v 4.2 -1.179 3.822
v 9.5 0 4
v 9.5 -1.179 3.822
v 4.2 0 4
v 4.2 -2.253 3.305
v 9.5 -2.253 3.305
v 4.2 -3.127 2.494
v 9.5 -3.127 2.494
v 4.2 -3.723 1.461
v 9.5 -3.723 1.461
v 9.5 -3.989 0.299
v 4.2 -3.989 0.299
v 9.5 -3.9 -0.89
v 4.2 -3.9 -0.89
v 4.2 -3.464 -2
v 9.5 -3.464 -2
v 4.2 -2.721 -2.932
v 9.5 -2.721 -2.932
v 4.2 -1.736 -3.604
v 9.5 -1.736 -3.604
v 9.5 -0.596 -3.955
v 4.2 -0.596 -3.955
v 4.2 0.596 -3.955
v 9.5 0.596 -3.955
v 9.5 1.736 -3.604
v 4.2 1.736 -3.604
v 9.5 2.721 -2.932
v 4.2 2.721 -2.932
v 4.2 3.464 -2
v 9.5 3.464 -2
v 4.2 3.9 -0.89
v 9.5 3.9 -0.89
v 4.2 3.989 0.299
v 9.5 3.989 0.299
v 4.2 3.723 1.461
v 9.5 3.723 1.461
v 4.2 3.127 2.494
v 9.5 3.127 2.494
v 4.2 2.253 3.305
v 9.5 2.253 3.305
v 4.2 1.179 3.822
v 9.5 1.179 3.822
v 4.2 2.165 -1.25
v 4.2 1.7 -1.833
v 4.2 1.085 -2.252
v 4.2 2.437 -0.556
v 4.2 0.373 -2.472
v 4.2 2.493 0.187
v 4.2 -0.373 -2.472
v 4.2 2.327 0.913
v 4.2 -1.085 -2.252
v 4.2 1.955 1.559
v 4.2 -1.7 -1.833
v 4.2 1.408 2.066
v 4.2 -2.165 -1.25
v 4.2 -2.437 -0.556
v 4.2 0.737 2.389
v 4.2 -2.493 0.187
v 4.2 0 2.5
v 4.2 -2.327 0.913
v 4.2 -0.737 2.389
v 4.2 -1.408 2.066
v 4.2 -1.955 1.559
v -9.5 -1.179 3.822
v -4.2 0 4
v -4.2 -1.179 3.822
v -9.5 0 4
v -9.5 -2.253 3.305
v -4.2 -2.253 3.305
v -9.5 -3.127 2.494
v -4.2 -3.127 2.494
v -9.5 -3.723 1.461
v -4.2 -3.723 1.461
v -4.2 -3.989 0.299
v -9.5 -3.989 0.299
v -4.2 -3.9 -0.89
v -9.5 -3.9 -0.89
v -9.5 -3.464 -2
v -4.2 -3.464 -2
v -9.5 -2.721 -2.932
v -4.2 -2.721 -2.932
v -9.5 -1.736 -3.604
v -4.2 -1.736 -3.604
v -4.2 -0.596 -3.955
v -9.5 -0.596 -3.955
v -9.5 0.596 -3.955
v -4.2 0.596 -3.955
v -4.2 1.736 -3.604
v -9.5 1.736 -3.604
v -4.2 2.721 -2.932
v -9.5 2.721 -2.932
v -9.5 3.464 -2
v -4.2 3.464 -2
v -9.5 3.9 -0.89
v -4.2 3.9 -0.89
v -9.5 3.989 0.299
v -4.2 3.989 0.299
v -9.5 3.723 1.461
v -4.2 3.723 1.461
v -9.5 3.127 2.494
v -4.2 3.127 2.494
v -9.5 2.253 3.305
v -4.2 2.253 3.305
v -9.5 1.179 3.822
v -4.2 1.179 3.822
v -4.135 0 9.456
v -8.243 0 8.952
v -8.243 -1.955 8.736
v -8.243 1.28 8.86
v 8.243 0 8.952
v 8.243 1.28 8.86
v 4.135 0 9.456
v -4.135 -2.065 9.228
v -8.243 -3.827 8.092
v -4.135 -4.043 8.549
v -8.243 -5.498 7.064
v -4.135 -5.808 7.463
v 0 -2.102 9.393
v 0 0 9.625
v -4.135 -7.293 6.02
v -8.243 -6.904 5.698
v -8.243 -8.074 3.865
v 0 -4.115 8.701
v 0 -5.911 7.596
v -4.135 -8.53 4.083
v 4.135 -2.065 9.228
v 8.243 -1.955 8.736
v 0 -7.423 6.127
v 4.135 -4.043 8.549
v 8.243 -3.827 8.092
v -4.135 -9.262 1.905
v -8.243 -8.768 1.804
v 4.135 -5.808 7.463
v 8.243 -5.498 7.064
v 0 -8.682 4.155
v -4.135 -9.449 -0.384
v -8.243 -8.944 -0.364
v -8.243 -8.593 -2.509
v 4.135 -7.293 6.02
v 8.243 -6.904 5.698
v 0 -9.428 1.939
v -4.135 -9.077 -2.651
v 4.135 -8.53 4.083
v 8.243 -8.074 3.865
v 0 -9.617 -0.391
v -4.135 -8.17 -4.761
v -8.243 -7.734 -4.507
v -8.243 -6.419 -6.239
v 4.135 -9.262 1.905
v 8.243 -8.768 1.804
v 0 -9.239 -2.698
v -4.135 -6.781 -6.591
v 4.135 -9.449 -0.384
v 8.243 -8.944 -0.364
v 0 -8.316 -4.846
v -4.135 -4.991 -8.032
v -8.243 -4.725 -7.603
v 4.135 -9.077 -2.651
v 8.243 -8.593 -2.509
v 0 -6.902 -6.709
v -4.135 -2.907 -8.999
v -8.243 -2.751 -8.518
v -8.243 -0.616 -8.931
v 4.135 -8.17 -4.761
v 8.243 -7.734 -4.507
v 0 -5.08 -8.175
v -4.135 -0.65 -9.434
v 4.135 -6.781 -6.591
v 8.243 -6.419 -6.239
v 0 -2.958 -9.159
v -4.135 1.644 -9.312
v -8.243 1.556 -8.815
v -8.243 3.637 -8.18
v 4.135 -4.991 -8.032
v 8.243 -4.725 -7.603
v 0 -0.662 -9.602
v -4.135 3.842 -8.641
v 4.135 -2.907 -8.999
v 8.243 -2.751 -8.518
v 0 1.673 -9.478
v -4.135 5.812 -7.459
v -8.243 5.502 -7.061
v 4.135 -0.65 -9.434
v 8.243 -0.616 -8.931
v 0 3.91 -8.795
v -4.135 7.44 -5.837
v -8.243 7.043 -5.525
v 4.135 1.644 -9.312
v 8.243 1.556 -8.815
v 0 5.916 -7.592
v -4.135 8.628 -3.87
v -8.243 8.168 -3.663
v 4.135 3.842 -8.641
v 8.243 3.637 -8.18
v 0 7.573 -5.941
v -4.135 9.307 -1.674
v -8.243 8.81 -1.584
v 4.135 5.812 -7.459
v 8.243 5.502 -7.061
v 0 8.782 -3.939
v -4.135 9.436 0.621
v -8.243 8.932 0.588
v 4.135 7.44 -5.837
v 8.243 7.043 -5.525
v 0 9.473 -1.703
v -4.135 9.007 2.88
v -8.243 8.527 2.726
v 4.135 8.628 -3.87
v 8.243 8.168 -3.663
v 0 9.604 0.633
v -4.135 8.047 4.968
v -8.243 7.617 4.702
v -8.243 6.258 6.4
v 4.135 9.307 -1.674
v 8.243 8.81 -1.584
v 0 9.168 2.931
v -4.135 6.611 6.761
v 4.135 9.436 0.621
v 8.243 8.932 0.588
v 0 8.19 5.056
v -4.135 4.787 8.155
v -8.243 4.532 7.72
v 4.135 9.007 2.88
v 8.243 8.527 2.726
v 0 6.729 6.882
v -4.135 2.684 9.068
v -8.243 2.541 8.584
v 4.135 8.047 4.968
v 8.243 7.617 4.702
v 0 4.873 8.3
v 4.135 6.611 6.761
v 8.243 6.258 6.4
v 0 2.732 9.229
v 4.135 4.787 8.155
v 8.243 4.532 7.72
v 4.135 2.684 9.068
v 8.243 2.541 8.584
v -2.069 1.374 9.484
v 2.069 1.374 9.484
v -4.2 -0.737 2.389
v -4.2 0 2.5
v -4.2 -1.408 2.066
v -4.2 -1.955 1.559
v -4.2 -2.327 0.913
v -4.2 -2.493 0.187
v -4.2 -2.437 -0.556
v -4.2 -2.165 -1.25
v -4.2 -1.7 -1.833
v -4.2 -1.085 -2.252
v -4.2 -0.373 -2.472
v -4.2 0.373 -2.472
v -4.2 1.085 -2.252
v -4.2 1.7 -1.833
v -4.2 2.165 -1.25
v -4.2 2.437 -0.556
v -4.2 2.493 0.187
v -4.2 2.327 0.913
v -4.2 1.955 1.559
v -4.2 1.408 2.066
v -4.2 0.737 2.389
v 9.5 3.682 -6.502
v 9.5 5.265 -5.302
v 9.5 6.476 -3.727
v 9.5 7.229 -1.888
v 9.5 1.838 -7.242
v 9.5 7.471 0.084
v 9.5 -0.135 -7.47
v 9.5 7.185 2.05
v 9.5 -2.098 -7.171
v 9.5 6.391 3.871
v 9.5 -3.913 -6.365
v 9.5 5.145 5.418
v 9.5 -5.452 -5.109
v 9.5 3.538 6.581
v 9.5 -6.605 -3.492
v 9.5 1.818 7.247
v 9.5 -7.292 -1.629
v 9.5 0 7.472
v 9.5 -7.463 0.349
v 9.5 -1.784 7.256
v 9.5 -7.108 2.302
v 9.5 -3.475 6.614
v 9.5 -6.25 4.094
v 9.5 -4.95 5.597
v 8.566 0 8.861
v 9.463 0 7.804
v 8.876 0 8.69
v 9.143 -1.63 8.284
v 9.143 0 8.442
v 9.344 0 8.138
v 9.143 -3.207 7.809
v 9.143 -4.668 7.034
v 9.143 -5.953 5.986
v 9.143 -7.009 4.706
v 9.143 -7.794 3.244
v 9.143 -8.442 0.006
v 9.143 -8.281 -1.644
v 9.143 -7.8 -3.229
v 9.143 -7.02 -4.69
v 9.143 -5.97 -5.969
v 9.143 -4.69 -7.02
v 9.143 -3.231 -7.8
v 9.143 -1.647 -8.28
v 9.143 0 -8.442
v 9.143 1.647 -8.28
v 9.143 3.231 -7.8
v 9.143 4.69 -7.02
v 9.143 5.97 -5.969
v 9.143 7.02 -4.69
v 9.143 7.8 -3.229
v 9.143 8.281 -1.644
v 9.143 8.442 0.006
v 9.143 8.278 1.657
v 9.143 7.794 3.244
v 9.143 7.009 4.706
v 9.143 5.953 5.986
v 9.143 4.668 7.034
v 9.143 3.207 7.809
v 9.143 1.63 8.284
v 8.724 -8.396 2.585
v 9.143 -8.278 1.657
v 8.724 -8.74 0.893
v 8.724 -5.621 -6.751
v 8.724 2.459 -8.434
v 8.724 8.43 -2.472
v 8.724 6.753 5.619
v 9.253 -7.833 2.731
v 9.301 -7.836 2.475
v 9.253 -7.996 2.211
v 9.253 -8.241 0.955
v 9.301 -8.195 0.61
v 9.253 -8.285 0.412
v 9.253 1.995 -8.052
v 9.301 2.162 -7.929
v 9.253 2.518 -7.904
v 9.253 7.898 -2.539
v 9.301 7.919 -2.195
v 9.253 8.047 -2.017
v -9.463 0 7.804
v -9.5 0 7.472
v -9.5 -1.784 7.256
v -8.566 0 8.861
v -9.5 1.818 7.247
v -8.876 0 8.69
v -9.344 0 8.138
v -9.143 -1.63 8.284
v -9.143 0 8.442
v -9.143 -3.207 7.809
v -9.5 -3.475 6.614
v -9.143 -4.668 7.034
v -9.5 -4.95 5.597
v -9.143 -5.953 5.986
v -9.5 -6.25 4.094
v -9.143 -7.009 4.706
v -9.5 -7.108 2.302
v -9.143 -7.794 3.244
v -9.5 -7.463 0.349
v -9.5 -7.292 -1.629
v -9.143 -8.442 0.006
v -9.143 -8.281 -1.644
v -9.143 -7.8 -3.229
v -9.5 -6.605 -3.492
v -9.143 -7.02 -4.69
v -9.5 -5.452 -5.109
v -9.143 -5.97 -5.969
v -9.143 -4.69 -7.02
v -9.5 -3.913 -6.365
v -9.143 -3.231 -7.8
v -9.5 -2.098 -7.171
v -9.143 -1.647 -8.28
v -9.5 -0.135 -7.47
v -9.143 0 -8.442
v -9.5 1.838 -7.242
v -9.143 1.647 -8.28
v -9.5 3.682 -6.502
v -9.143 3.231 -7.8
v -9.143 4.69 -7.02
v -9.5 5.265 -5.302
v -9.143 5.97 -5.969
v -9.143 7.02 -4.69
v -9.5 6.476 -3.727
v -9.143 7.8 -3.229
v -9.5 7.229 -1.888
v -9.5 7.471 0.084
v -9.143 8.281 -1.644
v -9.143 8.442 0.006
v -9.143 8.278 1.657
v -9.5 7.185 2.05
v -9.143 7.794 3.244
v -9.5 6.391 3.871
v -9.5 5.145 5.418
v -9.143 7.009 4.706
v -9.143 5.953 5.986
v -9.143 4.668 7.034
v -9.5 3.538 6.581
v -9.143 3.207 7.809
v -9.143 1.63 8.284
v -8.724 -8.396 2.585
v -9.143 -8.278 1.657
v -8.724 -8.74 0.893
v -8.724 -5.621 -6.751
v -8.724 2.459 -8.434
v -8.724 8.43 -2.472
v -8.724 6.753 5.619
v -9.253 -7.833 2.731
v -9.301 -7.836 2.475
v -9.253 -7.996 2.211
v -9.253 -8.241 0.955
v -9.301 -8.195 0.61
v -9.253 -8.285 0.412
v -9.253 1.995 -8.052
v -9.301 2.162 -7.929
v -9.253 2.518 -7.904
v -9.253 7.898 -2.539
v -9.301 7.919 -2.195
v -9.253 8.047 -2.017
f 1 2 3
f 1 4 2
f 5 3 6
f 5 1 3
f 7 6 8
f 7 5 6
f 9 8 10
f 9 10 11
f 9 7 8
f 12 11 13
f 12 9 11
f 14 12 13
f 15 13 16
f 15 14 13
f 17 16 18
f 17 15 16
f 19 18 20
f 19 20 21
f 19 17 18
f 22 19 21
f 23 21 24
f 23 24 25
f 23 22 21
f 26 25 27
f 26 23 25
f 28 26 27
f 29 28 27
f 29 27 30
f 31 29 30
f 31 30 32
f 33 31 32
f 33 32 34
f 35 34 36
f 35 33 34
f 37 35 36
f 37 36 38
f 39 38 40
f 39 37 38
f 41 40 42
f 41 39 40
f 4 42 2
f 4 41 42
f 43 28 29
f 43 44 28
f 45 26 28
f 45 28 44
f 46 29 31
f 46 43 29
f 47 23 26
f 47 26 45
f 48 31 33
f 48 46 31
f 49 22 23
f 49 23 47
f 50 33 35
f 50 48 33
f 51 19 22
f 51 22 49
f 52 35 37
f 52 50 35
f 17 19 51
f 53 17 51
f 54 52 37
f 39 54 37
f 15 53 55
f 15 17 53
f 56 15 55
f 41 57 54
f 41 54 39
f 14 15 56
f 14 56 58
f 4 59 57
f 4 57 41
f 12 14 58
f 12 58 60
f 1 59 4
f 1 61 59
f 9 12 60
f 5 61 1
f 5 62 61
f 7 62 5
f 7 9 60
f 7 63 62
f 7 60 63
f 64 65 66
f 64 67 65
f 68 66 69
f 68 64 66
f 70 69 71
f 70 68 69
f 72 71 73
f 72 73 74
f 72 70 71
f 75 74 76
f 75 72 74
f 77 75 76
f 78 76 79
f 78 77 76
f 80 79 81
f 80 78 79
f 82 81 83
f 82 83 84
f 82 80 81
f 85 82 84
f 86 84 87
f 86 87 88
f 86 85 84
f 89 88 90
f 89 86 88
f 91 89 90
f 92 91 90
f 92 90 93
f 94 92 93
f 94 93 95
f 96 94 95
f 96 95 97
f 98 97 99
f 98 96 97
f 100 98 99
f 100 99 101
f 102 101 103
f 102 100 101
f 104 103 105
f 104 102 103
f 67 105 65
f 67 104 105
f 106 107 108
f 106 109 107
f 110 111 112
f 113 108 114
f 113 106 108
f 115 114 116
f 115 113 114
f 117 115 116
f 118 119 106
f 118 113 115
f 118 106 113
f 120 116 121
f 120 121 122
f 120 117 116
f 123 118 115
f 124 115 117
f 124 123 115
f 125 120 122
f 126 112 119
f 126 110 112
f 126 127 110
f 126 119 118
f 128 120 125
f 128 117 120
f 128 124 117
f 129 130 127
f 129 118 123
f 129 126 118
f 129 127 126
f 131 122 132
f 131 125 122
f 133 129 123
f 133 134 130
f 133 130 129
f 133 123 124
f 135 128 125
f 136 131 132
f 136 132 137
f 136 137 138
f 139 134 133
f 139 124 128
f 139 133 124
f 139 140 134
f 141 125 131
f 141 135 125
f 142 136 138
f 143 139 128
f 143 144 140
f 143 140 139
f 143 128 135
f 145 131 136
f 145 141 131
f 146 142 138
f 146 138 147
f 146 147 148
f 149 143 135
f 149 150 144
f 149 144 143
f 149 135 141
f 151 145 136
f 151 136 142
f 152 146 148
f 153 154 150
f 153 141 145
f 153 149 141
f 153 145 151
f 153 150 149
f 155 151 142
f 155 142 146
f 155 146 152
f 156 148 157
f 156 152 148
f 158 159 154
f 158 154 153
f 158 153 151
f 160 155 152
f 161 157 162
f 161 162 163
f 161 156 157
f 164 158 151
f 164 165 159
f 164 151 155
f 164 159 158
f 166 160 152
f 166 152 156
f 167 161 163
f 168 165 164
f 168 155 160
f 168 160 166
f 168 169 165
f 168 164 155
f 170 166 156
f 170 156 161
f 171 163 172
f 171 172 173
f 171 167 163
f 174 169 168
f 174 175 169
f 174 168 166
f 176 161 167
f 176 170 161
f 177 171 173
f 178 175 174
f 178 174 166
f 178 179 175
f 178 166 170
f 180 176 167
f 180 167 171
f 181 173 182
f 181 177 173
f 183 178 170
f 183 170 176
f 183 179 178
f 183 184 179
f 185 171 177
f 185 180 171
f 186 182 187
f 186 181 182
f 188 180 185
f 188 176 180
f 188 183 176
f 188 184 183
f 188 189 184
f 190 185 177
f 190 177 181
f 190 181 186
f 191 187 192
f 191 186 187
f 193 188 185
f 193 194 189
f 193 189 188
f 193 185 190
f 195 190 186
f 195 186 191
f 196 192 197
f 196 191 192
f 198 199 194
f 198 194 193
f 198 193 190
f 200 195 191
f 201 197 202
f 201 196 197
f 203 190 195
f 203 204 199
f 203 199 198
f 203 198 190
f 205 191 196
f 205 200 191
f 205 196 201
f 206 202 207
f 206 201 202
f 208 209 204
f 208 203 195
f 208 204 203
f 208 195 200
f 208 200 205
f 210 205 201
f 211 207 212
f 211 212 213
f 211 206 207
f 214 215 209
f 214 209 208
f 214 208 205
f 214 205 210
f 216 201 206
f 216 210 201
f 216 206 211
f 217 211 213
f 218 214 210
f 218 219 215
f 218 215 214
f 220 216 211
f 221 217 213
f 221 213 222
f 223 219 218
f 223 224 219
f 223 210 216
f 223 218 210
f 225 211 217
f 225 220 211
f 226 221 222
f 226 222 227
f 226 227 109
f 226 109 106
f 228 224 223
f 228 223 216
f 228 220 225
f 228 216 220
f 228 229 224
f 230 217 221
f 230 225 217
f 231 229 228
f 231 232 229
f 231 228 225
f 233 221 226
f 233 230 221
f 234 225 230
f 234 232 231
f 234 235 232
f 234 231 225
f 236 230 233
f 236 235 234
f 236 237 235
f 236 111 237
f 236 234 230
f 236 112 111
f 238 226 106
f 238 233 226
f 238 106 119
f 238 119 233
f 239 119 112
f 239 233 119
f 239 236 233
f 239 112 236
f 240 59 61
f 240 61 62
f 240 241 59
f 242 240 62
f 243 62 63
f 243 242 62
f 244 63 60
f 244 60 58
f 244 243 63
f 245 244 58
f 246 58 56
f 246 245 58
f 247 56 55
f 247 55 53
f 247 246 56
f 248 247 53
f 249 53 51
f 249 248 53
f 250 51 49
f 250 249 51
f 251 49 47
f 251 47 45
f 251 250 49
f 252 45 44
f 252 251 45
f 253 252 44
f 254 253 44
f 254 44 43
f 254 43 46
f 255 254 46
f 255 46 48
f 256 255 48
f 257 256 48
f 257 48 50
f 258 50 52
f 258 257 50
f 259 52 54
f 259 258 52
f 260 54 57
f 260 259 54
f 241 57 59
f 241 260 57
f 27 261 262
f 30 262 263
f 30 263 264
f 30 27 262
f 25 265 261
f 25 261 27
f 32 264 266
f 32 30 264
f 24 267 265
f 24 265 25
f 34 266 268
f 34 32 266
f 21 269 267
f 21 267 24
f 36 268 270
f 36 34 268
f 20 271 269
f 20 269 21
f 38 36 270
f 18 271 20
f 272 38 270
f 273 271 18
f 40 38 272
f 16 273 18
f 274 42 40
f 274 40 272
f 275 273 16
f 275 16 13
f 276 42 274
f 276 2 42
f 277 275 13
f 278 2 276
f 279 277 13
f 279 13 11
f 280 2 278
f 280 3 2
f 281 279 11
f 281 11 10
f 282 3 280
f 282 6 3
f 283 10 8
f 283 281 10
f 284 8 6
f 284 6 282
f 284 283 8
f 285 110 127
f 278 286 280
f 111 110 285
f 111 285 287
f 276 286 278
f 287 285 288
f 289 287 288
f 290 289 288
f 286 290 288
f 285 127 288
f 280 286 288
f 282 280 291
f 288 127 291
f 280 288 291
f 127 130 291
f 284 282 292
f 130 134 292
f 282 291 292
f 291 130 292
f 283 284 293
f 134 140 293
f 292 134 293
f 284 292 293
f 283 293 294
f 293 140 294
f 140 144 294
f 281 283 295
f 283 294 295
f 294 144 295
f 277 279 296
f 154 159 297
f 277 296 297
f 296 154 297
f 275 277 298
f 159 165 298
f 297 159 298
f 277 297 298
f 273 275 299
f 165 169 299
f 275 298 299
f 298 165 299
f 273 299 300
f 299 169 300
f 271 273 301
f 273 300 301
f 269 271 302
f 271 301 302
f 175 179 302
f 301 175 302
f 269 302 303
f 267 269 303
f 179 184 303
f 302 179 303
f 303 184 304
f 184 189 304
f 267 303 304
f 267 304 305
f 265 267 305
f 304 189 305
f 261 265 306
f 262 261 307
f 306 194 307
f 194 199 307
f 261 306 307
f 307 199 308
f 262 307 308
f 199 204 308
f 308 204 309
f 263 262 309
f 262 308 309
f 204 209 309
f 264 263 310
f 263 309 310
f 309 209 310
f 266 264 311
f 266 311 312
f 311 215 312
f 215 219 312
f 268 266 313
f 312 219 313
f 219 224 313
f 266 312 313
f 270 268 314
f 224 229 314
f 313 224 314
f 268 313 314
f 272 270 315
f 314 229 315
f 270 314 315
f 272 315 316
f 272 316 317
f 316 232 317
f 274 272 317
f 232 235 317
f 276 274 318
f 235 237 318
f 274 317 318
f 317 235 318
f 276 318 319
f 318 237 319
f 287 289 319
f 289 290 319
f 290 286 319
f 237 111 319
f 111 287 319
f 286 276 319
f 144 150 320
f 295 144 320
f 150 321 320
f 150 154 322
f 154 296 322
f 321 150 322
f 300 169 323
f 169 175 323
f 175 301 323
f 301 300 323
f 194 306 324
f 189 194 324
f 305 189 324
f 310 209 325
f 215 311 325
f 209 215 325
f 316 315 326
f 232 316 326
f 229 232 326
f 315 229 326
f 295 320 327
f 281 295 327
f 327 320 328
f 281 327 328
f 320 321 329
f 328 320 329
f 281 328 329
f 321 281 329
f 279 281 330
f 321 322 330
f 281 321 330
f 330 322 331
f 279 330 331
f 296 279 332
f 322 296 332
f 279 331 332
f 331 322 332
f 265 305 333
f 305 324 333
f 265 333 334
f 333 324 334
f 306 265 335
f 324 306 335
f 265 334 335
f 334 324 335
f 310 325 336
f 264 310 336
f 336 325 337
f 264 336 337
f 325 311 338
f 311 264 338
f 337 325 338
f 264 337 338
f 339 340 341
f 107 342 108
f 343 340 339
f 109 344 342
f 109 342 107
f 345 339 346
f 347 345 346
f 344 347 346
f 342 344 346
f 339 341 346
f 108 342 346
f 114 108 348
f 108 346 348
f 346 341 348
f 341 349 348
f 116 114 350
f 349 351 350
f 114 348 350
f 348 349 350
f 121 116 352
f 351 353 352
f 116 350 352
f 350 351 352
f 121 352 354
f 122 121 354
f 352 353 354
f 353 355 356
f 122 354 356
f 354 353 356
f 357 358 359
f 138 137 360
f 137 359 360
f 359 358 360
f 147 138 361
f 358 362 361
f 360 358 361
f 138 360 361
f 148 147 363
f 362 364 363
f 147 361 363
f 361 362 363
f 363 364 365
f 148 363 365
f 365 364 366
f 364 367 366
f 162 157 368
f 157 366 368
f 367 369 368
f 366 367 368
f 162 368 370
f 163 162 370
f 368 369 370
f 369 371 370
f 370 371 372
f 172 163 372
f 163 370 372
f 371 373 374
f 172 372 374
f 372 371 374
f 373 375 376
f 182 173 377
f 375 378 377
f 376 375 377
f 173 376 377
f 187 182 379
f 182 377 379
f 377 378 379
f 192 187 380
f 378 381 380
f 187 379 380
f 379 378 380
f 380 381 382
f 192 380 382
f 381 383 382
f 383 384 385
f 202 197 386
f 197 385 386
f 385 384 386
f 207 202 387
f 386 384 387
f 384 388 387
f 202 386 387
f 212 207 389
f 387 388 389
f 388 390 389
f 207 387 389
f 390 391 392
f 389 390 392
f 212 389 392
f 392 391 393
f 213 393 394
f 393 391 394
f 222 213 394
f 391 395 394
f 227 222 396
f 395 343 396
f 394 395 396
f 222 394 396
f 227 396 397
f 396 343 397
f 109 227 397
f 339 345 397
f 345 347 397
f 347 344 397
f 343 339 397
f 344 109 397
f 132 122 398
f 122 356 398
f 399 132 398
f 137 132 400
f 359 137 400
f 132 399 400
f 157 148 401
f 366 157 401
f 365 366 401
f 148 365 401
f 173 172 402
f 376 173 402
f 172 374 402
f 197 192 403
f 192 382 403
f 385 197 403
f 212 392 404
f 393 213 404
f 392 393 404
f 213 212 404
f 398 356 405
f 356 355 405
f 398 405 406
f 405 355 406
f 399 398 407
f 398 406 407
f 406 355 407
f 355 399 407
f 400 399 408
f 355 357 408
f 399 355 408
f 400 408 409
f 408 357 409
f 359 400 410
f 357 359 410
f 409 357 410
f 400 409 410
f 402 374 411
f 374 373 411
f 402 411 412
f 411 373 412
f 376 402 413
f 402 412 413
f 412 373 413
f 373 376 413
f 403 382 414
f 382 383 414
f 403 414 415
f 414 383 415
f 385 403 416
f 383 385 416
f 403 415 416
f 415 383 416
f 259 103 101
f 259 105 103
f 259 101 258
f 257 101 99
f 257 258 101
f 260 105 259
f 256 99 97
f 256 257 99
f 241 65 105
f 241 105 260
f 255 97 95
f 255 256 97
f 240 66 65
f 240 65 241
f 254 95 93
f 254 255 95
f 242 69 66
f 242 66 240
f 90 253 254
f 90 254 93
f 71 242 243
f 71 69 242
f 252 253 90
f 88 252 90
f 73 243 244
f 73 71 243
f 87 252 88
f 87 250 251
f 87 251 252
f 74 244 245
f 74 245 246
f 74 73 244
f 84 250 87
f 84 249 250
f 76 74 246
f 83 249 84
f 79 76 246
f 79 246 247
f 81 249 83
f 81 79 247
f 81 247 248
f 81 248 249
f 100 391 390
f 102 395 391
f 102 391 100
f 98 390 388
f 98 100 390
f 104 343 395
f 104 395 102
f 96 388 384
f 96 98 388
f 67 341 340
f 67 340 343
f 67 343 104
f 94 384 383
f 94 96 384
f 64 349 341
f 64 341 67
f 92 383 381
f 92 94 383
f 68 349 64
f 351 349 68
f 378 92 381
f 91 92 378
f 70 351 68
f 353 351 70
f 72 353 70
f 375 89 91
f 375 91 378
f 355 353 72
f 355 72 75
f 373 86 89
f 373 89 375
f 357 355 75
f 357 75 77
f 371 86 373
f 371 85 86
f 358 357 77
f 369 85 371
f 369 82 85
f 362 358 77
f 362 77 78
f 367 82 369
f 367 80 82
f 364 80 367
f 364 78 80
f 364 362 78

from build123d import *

# Parameters (mm, degrees)
FILLET_1_R = 1.5


with BuildPart() as part:
    # ｽｹｯﾁ1 → 回転1 (revolve)
    with BuildSketch(Plane.XY, mode=Mode.PRIVATE) as revolve_1_sk:
        with BuildLine():
            Line((4.2, 2.5), (-4.2, 2.5))
            Line((-4.2, 2.5), (-4.2, 4))
            Line((-4.2, 4), (-9.5, 4))
            Line((-9.5, 4), (-9.5, 8.72880747))
            ThreePointArc((-9.5, 8.72880747), (0, 9.625), (9.5, 8.72880747))
            Line((9.5, 8.72880747), (9.5, 4))
            Line((9.5, 4), (4.2, 4))
            Line((4.2, 4), (4.2, 2.5))
        make_face()
    revolve(revolve_1_sk.sketch.rotate(Axis((0, 0, 0), (1, 0, 0)), 90), axis=Axis((0, 0, 0), (1, 0, 0)))

    # ﾌｨﾚｯﾄ1
    fillet_1_edges = [part.edges().sort_by_distance(p)[0] for p in [
        (9.5, 0, -8.72880747),
        (-9.5, 0, -8.72880747),
    ]]
    fillet(fillet_1_edges, radius=FILLET_1_R)


solid = part.part
